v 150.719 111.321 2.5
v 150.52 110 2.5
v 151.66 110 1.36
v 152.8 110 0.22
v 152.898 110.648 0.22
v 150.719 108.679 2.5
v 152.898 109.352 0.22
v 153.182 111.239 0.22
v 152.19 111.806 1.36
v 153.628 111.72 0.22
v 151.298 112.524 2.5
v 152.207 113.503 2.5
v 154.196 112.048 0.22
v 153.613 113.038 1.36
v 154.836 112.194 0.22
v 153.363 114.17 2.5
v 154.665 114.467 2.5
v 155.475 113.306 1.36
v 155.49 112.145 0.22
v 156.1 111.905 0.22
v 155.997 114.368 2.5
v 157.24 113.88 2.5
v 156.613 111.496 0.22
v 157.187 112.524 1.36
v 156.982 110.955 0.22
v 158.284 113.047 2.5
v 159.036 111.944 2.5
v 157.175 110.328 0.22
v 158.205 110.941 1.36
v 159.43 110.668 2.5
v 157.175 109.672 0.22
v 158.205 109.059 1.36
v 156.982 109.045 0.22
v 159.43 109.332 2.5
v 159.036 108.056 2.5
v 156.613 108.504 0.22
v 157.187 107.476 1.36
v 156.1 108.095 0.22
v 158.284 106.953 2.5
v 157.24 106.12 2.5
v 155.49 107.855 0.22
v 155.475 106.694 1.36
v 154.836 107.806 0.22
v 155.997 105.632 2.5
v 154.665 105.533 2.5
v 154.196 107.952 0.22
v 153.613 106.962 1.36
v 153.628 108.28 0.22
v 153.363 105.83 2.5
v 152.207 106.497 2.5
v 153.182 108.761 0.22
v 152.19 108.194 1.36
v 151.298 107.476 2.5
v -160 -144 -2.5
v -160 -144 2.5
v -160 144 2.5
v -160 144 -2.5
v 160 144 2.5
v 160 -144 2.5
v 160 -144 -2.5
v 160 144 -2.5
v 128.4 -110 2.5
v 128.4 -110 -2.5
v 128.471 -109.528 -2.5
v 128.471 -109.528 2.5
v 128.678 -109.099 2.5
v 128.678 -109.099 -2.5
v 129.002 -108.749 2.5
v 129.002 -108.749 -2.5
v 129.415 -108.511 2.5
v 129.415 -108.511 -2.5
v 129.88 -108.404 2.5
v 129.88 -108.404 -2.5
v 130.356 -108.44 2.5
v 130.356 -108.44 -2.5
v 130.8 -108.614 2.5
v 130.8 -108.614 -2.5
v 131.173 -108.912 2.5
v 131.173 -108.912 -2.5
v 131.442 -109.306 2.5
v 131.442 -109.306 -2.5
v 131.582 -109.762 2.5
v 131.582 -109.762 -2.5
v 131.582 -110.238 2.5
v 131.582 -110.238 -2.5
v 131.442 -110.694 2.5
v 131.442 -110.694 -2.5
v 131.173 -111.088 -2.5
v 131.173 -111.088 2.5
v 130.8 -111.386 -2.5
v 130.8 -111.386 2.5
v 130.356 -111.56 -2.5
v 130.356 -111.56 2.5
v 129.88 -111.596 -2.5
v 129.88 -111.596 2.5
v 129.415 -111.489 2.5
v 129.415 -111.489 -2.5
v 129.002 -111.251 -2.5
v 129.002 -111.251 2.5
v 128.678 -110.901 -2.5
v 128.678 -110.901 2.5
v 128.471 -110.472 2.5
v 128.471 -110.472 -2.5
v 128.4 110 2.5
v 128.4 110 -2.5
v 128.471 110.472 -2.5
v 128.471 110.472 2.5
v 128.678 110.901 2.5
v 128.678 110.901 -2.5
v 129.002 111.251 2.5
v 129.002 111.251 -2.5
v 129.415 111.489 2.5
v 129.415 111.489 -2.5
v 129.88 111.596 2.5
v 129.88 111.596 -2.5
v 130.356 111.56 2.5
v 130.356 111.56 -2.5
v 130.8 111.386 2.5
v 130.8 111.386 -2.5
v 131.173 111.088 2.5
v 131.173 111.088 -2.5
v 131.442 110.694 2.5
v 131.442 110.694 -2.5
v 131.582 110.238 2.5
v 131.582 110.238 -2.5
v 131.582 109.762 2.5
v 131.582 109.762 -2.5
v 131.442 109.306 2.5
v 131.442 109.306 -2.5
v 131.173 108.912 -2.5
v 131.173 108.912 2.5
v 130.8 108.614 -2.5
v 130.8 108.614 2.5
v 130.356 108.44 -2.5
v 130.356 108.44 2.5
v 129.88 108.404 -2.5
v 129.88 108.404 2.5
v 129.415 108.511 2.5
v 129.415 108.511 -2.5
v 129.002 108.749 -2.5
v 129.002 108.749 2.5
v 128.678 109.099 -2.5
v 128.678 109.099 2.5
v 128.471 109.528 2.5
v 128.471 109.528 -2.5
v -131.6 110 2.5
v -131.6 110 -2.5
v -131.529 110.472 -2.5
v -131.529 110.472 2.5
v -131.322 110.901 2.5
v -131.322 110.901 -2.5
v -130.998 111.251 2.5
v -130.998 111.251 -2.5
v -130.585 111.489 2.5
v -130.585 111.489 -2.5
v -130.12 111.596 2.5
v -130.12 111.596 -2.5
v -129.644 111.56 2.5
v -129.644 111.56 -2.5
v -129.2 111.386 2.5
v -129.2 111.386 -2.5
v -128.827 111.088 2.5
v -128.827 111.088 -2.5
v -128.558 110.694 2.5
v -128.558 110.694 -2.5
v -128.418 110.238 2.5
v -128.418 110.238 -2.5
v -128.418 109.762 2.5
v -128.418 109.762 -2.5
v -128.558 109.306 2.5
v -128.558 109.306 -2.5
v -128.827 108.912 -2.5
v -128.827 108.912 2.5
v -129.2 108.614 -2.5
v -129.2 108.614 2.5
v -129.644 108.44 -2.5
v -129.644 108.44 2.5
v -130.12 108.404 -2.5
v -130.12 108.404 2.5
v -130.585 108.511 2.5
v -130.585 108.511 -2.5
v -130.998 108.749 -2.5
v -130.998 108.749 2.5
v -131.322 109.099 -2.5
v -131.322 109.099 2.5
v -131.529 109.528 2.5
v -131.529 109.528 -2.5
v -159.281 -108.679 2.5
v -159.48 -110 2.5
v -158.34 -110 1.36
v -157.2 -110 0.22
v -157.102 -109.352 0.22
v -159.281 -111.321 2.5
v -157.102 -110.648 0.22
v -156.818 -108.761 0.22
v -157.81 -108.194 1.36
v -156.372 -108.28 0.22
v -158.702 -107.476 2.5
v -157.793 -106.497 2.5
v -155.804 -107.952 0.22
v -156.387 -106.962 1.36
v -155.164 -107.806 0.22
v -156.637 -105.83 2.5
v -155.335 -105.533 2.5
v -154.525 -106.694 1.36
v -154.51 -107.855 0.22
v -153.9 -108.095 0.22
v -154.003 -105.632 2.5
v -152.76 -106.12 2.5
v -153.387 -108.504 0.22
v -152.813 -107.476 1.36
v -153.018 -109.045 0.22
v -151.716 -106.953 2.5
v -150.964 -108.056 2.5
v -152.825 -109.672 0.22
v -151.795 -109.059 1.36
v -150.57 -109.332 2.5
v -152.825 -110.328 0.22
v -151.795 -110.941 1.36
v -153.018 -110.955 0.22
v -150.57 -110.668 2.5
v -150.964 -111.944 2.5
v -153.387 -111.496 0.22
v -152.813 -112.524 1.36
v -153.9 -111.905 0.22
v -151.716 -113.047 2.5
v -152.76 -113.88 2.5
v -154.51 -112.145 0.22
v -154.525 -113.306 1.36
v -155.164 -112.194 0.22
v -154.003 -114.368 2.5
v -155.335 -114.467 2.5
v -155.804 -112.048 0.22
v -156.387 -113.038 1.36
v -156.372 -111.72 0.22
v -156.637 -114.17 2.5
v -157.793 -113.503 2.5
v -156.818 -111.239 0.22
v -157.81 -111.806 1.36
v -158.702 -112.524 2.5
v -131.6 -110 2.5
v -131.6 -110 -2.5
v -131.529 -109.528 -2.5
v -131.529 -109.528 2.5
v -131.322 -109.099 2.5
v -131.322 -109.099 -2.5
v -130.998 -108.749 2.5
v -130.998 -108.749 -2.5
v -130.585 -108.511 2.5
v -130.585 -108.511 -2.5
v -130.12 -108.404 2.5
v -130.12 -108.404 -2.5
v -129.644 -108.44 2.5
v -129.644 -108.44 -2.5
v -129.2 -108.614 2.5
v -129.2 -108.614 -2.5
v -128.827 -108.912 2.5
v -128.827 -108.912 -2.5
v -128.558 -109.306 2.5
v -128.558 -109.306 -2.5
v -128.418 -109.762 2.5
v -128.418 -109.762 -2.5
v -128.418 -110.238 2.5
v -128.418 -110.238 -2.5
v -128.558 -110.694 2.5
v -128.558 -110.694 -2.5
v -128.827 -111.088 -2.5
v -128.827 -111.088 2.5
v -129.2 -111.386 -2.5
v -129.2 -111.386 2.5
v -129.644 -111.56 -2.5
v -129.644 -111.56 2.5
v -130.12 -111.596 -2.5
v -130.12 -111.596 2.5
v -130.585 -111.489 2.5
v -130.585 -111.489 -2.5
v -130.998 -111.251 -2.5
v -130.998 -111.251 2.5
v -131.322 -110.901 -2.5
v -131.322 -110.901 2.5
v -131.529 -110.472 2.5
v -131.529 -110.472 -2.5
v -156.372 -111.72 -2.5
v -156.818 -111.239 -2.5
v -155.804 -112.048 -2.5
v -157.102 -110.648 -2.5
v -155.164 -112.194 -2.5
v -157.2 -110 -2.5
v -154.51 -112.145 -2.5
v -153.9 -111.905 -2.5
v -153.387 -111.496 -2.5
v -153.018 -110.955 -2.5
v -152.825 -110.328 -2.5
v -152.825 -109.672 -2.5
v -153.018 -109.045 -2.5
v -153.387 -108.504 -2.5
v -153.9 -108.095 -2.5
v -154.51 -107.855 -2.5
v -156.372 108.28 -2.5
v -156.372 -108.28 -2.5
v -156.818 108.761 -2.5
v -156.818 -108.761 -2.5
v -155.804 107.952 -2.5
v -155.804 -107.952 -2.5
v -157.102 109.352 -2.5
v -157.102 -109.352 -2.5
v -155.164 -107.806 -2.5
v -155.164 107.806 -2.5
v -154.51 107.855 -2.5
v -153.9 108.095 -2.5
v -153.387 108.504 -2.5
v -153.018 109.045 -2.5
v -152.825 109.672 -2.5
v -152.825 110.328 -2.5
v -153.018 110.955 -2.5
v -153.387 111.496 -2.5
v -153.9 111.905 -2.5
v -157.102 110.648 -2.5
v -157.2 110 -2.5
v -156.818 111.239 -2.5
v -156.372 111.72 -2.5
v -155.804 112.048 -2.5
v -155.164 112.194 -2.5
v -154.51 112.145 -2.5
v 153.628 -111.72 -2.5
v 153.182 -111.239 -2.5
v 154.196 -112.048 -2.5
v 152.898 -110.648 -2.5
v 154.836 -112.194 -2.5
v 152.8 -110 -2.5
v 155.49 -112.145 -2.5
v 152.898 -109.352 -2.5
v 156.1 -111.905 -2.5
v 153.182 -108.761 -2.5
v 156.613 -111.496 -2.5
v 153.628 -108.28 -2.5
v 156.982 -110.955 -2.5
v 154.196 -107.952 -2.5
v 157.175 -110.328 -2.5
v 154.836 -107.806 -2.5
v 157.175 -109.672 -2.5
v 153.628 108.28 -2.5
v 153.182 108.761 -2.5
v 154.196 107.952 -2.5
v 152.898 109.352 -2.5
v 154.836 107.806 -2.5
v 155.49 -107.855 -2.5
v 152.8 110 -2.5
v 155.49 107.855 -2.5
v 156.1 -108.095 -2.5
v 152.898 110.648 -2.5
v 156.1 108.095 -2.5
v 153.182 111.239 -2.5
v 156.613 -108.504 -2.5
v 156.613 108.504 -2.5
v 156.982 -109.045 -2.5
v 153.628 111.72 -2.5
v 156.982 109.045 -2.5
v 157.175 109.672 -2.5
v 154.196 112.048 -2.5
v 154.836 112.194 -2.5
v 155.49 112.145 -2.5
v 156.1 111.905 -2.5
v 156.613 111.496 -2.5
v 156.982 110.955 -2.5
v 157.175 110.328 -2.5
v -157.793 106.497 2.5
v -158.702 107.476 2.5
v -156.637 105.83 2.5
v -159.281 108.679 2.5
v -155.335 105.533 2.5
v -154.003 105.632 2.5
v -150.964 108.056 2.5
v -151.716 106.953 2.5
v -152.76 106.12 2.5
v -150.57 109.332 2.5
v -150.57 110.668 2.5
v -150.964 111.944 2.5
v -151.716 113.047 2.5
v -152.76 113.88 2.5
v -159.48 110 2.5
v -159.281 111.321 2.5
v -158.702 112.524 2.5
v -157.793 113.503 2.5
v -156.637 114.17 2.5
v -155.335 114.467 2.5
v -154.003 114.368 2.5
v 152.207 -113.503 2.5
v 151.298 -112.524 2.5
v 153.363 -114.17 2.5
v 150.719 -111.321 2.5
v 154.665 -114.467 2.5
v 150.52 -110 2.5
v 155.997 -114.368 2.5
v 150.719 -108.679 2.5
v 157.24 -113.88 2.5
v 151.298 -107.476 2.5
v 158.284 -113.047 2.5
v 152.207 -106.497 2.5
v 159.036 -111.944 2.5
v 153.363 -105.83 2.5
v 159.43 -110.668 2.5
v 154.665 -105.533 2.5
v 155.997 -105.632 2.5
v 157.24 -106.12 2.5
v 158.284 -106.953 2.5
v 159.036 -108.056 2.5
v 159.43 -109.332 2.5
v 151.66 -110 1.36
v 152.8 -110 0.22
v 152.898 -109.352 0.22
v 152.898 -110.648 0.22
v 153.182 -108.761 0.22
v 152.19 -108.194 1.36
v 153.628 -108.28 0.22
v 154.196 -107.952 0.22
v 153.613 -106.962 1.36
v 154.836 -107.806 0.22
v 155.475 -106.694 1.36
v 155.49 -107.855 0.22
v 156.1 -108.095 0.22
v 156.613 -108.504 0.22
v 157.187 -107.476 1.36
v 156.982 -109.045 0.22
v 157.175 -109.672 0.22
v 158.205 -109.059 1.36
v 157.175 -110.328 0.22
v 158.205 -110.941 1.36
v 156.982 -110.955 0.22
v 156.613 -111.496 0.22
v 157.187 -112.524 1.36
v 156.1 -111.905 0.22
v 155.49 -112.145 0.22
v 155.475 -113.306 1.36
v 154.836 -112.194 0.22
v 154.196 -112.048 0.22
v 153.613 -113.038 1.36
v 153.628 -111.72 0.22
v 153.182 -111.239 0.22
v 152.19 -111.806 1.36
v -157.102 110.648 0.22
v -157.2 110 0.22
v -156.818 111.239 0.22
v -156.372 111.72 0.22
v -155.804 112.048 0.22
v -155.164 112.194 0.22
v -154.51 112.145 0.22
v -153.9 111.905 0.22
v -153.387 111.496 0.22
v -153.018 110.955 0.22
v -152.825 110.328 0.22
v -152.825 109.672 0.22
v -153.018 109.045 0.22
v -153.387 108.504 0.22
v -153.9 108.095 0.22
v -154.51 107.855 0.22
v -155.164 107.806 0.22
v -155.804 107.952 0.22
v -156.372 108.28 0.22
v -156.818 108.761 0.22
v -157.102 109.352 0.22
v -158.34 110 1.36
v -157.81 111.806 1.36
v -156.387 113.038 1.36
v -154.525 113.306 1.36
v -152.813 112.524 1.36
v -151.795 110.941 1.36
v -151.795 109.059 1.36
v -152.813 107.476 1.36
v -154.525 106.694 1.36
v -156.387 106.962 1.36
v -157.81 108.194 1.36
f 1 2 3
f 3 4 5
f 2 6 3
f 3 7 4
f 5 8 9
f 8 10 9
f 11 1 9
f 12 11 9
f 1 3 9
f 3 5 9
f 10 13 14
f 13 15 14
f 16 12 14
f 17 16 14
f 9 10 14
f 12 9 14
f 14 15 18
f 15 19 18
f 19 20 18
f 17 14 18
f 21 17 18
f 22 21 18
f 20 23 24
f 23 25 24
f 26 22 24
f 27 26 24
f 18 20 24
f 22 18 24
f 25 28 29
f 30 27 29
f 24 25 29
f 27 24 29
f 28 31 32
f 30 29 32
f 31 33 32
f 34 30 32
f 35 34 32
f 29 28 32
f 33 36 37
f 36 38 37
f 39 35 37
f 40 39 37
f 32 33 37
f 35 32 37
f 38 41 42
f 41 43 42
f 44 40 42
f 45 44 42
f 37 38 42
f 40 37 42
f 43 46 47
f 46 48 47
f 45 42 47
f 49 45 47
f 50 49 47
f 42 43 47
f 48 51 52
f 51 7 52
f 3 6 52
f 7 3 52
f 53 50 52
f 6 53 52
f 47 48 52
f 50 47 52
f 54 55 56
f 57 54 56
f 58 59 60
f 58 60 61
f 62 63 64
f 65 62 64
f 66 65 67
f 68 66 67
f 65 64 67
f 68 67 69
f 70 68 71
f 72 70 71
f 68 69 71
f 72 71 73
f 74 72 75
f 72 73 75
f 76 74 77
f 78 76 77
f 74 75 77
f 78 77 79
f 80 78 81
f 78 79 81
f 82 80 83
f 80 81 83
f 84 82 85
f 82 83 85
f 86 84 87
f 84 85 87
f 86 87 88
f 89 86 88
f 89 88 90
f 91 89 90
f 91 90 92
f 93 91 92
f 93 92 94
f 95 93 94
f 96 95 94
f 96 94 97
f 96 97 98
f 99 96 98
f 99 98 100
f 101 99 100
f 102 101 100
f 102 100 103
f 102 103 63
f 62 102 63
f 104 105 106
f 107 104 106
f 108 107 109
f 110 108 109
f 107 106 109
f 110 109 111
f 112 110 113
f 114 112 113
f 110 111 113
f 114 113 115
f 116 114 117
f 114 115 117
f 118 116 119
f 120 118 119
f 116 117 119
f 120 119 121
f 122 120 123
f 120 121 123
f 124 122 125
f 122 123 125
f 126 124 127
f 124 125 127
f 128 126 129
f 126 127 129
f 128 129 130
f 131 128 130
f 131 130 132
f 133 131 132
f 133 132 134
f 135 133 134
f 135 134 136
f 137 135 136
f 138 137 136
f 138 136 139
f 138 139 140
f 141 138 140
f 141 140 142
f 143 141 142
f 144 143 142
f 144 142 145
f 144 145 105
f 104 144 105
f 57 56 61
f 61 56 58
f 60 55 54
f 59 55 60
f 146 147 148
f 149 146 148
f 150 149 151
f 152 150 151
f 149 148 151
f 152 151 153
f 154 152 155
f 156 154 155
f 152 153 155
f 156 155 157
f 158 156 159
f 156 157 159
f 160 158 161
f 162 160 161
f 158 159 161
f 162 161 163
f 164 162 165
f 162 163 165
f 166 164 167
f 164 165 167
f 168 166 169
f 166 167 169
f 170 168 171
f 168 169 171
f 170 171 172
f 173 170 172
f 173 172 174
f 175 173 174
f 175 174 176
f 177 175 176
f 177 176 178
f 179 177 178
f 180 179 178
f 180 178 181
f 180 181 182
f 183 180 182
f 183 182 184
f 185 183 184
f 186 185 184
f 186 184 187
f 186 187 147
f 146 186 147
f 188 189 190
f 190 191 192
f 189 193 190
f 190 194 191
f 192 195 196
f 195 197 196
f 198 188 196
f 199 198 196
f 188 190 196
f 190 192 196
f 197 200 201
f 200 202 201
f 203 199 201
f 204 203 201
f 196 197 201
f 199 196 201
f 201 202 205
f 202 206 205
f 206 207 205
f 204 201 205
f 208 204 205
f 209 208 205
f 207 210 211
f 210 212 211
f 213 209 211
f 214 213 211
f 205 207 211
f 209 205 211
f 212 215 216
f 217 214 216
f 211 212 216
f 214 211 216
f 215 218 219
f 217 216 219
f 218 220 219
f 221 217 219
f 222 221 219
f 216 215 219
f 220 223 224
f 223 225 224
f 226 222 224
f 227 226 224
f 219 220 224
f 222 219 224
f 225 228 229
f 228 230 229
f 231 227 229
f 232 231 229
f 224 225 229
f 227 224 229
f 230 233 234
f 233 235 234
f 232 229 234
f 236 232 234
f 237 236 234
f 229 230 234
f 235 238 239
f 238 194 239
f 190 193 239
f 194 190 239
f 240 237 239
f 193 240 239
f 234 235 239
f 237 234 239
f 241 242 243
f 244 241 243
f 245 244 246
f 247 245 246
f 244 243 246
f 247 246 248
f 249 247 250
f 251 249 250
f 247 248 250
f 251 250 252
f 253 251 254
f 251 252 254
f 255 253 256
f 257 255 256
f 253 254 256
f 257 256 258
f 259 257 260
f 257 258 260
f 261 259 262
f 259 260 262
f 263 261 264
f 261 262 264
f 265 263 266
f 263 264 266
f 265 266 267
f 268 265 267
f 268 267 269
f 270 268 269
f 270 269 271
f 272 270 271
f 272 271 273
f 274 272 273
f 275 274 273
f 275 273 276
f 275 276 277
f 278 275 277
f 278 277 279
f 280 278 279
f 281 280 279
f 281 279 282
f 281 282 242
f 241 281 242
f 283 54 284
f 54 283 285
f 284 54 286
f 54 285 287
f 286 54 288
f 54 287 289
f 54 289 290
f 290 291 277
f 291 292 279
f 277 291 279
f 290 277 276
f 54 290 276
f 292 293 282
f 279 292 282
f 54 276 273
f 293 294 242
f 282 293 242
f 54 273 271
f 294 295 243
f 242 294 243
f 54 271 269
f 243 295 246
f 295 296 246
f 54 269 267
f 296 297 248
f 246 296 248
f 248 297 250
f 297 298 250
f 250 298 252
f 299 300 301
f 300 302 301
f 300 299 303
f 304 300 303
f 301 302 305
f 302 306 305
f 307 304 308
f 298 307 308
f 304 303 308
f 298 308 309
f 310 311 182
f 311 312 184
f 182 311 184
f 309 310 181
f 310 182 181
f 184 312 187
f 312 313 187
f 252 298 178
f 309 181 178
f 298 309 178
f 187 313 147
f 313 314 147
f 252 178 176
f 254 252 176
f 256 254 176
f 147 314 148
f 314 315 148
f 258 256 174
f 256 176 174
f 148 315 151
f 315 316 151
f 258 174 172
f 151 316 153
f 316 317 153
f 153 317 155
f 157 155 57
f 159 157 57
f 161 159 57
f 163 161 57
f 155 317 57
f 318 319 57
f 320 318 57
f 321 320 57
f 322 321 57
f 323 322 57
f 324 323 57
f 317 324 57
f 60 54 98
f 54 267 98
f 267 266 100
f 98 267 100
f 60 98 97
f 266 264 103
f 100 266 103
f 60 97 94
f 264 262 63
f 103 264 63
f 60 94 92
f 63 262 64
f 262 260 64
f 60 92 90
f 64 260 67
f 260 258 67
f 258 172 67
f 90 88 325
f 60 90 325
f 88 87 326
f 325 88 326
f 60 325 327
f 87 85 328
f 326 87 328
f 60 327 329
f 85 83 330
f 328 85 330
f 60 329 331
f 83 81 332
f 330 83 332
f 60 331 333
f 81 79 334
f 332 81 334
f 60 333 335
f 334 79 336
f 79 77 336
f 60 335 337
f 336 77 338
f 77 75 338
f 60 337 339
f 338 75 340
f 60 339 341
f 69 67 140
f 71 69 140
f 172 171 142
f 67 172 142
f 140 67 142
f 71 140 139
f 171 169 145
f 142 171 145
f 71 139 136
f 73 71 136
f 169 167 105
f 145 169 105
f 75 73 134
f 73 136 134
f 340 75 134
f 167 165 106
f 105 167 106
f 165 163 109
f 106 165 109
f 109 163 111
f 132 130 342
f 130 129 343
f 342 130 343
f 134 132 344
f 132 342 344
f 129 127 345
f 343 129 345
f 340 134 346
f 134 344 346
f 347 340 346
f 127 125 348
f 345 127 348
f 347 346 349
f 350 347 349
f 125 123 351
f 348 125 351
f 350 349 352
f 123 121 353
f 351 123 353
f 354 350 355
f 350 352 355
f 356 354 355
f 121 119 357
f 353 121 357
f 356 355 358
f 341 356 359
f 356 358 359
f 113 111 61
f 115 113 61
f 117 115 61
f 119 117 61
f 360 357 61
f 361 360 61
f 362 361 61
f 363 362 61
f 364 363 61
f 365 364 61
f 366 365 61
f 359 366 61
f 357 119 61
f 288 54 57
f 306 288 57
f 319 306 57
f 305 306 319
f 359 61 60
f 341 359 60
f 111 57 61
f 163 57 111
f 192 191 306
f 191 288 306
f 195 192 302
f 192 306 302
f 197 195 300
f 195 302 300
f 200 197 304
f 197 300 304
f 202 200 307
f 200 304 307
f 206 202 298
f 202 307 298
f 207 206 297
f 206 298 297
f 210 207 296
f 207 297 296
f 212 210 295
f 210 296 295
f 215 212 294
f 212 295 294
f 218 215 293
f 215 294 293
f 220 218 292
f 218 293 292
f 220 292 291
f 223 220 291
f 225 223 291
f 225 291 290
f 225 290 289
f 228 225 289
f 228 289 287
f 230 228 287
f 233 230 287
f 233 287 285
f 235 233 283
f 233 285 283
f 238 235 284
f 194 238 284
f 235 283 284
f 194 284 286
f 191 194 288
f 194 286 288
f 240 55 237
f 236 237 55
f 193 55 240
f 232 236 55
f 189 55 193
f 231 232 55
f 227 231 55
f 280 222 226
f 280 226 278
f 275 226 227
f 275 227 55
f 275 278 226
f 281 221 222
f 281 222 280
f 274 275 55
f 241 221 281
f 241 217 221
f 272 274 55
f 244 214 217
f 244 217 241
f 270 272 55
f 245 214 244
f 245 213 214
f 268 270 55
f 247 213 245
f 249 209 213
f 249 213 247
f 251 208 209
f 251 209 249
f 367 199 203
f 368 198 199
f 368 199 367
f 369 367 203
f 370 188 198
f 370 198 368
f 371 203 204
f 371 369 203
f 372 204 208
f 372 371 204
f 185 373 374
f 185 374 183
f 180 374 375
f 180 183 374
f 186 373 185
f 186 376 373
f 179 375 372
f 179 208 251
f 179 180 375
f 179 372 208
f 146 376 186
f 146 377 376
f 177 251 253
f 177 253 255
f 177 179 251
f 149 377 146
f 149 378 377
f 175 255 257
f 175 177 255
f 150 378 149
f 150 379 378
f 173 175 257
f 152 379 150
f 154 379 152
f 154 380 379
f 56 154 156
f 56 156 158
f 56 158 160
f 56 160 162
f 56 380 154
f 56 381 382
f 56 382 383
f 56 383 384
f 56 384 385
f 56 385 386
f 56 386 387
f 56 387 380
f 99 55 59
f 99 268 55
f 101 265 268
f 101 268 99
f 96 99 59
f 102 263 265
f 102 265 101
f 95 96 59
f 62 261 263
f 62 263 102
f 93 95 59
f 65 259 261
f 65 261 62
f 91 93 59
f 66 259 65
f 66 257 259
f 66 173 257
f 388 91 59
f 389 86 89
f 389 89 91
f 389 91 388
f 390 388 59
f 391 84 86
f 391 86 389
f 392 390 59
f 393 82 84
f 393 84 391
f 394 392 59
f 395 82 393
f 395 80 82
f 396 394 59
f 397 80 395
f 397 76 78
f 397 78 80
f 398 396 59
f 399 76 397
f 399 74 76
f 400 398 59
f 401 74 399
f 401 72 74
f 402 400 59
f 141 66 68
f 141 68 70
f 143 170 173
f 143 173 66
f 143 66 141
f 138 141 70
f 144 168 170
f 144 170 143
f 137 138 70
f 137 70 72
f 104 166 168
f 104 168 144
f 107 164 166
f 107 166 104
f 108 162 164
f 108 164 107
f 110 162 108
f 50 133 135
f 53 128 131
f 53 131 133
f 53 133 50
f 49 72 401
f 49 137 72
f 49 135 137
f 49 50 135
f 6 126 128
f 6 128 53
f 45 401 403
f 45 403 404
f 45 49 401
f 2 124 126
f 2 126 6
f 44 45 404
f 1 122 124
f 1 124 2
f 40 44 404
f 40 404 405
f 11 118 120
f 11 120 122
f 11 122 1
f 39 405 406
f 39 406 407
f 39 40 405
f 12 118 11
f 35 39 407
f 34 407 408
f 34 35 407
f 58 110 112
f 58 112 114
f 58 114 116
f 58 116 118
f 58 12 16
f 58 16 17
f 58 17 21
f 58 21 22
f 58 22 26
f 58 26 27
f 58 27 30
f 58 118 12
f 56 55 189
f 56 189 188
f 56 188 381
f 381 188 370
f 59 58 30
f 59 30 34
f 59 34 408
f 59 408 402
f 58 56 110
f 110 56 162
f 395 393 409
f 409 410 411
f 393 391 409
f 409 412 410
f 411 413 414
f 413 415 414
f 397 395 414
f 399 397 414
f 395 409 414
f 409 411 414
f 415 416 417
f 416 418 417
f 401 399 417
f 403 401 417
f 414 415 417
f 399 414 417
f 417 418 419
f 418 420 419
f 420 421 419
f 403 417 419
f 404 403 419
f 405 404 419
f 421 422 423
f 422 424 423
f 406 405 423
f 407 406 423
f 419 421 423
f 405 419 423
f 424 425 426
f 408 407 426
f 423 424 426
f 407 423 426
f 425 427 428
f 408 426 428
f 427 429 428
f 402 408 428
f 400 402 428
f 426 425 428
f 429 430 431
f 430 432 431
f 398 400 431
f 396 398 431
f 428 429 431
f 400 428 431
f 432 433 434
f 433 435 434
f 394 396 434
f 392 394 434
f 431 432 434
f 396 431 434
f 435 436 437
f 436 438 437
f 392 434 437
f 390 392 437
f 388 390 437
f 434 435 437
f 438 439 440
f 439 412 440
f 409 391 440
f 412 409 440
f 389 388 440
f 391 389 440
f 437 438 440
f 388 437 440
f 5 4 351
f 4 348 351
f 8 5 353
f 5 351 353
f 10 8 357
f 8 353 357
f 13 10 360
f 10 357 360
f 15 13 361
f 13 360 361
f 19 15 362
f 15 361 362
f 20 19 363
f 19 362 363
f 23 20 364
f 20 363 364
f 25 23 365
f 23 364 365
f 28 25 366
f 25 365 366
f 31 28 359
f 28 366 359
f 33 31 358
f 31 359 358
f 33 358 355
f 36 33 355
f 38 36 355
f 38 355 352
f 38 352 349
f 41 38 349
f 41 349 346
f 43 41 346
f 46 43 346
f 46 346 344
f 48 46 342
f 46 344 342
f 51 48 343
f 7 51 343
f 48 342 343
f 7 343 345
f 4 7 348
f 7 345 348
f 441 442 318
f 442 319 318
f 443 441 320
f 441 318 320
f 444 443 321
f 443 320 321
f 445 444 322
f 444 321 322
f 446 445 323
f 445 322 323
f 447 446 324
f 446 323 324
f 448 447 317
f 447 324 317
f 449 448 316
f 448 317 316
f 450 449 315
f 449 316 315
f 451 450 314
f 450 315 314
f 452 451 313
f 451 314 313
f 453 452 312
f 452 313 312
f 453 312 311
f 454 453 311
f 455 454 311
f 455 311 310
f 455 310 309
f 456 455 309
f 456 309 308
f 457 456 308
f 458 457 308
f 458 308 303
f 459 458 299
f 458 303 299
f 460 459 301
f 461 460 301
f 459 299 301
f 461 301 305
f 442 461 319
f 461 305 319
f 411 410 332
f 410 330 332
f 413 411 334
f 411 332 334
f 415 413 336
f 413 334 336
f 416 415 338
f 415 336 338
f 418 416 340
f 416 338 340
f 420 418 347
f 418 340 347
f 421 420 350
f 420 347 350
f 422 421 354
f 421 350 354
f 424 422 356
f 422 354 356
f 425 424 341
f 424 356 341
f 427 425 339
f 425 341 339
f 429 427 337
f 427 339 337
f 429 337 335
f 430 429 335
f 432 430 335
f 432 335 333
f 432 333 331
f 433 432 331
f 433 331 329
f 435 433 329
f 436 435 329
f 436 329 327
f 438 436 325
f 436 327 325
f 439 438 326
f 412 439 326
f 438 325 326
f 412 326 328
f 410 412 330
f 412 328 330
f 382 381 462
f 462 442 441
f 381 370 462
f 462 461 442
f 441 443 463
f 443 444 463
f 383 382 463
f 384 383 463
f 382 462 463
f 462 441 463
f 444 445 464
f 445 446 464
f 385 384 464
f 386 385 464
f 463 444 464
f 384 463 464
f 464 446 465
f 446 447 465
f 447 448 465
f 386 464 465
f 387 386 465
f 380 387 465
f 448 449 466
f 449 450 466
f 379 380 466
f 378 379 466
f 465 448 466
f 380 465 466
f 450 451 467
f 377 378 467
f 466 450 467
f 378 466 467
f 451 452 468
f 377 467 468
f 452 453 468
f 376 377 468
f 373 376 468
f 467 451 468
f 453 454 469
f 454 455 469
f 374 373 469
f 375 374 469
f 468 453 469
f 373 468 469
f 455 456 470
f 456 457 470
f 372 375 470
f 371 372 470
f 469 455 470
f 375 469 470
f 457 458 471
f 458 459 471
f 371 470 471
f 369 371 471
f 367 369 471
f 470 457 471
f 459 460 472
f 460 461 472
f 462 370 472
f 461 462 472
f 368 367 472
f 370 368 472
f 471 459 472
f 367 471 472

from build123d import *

# Parameters (mm, degrees)
F0_W           = 320
F0_H           = 288
F1_DEPTH       = 2.5
F3_D           = 4.4
F3_DEPTH       = 17.25
F3_CSINK_D     = 8.96
F3_CSINK_ANGLE = 90
F3_TIP         = 1.3218933619
F5_D           = 3.2


with BuildPart() as f1:
    # F0 (on Top) → F1 (new body, symmetric)
    with BuildSketch(Plane.XY):
        Rectangle(F0_W, F0_H)
    extrude(amount=F1_DEPTH, both=True)

    # F3
    with Locations(Plane.XY.offset(2.5)):
        with Locations((-155, -110), (155, -110), (155, 110), (-155, 110)):
            CounterSinkHole(F3_D / 2, F3_CSINK_D / 2, depth=F3_DEPTH, counter_sink_angle=F3_CSINK_ANGLE)
            with Locations((0, 0, -(F3_DEPTH + F3_TIP / 2))):  # 118° drill point
                Cone(0, F3_D / 2, F3_TIP, mode=Mode.SUBTRACT)

    # F5 (through all)
    with Locations(Plane.XY.offset(2.5)):
        with Locations((-130, -110), (-130, 110), (130, 110), (130, -110)):
            Hole(F5_D / 2)


solid = f1.part
